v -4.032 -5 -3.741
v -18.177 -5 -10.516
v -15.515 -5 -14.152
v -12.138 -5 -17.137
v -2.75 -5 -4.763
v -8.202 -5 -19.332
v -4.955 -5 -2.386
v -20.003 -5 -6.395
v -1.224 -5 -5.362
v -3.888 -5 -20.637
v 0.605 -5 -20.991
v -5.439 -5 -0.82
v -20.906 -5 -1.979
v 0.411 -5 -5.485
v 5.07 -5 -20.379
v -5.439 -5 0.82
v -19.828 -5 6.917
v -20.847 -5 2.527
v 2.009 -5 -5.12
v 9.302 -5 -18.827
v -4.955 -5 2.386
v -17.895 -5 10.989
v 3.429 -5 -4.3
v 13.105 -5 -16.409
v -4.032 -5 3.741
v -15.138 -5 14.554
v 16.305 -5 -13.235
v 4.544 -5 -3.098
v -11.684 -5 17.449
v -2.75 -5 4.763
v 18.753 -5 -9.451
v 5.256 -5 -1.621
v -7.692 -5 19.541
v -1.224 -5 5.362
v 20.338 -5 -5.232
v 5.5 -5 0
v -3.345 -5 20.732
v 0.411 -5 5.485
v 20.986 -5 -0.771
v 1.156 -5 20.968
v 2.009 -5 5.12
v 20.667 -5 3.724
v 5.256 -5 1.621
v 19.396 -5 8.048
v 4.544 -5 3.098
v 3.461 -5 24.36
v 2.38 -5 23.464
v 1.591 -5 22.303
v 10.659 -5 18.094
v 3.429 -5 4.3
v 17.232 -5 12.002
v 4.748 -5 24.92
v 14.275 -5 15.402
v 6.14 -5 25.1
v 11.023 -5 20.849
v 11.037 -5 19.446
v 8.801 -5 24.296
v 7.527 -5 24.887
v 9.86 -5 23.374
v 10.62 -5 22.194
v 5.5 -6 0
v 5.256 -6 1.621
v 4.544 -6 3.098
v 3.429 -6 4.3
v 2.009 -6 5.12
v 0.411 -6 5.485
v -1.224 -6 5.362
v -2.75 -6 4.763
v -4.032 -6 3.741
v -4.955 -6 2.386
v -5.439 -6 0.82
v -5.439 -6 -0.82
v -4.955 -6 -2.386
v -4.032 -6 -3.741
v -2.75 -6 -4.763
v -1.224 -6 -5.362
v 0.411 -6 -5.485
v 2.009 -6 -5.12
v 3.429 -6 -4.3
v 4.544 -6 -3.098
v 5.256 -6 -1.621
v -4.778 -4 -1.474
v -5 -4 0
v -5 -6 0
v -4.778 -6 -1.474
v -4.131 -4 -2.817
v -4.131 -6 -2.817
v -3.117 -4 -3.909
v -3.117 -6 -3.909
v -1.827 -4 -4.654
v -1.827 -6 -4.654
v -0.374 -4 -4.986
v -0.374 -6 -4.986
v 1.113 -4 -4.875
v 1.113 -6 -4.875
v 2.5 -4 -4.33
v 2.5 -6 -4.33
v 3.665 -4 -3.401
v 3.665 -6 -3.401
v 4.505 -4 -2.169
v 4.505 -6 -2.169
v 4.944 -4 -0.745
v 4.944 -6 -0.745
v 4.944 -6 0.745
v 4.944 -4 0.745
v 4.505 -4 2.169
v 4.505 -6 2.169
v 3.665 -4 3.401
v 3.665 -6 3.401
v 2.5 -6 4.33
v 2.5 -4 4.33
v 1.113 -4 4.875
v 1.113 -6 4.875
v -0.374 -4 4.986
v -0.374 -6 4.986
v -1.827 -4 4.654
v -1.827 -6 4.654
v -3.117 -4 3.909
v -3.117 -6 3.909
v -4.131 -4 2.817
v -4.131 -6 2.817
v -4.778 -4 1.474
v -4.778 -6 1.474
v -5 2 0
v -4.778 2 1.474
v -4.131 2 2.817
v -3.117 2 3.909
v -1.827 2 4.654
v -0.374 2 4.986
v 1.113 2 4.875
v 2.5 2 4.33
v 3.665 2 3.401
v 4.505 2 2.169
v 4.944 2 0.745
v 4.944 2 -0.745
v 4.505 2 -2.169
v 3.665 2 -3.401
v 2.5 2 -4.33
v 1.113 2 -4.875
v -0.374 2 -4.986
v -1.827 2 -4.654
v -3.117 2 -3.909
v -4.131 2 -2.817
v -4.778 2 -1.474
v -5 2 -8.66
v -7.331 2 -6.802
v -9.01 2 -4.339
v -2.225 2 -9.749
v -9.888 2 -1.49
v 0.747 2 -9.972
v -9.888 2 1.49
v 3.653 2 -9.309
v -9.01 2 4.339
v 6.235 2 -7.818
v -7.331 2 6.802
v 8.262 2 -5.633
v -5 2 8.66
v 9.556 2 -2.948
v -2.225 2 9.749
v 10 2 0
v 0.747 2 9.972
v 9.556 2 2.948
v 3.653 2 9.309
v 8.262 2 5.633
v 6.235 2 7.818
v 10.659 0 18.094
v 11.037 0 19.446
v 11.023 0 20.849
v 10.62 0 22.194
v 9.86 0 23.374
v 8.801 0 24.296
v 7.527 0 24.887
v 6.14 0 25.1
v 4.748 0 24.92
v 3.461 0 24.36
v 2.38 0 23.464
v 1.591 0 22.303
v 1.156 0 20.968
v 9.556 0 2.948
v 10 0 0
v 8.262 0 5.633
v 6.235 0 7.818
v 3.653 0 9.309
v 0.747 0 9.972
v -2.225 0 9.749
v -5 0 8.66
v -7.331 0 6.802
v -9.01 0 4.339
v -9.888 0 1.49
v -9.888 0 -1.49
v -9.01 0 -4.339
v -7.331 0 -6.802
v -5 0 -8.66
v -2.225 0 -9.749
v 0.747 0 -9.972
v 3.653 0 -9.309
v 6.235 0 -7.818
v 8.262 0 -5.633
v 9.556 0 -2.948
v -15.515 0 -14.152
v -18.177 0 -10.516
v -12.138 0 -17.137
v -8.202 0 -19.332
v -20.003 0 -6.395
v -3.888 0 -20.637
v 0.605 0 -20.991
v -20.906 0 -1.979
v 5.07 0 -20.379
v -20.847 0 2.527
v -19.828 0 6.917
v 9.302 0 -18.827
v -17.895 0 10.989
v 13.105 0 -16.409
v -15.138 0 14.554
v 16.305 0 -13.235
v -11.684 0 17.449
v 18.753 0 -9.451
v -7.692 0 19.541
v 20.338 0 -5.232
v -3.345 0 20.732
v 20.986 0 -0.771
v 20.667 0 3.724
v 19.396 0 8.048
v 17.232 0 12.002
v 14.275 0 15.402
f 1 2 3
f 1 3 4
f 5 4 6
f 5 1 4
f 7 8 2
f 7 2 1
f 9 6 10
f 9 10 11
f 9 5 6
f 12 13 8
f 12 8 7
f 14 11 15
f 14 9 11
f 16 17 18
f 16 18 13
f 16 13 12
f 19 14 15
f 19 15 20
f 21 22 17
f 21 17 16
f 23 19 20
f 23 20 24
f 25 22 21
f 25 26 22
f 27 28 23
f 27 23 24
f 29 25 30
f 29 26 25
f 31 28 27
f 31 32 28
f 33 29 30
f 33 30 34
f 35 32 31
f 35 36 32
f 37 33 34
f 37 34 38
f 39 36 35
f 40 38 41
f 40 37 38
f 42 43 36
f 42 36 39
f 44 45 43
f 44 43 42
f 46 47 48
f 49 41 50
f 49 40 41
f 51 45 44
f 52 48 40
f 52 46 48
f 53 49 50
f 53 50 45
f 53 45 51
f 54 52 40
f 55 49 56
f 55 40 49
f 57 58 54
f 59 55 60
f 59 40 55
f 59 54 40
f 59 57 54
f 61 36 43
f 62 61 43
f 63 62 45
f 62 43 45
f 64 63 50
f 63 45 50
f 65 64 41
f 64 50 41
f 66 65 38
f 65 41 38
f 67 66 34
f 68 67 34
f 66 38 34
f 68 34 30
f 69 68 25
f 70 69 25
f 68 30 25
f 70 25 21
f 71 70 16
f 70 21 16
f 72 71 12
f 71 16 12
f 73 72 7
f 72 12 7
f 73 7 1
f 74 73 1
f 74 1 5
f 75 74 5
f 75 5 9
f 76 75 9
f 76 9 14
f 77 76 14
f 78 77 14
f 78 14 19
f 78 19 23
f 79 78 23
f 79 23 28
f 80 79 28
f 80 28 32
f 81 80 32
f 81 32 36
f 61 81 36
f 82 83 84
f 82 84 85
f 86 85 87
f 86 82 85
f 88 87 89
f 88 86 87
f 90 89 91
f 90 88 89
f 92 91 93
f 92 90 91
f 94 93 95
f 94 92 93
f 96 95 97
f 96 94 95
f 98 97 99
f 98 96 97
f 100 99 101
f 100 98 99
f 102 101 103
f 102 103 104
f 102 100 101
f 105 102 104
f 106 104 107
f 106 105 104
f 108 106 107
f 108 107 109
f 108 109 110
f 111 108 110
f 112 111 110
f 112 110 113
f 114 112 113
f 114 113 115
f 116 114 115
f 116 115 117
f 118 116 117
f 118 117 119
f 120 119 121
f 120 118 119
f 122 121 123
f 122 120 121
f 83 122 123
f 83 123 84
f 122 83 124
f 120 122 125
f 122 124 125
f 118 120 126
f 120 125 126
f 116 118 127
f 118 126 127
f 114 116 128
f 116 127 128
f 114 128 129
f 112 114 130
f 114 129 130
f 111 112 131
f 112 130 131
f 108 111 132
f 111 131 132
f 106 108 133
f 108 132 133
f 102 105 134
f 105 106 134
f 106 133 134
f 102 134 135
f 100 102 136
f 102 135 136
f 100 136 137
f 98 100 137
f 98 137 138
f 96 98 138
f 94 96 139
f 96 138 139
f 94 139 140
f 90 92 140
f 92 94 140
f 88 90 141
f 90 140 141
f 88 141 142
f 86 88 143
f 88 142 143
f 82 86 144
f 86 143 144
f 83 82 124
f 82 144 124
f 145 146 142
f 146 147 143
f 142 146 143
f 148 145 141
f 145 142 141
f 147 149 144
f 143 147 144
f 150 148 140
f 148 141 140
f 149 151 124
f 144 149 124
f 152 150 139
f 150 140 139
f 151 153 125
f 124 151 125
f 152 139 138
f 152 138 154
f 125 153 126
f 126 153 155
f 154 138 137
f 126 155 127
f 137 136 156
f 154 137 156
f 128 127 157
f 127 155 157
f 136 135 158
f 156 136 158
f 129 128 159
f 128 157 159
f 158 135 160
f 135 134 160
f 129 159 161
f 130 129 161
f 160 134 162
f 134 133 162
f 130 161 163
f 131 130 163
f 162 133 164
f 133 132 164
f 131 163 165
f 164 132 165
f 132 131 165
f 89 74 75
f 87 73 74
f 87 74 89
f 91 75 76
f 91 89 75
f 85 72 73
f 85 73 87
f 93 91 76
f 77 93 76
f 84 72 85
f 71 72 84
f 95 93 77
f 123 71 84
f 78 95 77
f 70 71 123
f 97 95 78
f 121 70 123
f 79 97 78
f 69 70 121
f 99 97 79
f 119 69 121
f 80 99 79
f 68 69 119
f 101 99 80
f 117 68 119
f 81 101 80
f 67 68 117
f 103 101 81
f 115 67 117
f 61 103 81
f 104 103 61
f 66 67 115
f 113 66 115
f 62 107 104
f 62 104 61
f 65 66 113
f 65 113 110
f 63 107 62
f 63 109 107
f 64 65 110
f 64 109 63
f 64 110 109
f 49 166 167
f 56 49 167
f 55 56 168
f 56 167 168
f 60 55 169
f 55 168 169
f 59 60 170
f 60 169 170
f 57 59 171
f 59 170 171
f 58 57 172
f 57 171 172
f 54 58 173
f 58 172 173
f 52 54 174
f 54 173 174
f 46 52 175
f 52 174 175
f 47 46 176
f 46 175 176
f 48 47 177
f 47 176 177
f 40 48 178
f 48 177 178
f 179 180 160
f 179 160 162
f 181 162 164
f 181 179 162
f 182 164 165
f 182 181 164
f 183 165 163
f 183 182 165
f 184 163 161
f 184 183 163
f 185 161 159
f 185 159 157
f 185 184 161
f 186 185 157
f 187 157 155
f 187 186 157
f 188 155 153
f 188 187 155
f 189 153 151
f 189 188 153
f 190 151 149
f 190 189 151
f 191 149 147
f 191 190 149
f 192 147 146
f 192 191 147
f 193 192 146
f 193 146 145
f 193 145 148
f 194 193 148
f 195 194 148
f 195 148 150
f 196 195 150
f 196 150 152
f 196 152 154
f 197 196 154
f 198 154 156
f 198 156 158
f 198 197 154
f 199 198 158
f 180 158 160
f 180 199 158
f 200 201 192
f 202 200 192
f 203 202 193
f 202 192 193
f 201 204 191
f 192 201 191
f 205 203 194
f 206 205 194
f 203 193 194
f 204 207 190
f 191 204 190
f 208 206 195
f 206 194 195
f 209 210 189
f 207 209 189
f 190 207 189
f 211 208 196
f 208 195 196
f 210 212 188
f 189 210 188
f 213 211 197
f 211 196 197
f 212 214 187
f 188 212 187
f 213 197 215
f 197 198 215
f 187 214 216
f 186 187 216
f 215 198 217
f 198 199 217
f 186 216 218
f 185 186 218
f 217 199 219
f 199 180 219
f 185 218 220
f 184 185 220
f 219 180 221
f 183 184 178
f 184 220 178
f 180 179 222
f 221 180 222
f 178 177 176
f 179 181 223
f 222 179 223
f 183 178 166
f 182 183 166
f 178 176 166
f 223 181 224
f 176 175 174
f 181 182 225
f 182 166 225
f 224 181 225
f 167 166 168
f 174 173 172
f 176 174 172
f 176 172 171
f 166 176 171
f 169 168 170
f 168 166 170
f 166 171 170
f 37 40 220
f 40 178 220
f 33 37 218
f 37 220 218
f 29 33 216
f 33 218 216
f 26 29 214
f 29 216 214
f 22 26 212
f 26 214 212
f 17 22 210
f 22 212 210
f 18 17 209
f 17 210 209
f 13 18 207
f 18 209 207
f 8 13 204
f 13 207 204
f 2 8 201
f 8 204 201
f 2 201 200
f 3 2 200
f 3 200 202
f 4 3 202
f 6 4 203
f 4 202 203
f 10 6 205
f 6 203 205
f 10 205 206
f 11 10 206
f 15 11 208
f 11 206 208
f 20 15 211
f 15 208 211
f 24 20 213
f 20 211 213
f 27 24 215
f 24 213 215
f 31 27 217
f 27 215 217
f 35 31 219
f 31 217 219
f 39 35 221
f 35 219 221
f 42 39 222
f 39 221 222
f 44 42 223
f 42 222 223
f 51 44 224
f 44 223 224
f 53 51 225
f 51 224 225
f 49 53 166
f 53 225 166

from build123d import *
from build123d import SkipClean  # not in build123d's __all__

# Parameters (mm, degrees)
F2_R      = 21
F3_DEPTH  = 3
F4_R      = 10
F5_DEPTH  = 2
F6_R      = 5
F7_DEPTH  = 25
F8_R      = 5
F9_DEPTH  = 3
F10_R     = 5.5
F11_DEPTH = 1
F12_DEPTH = 1
F13_R     = 5.5
F14_DEPTH = 1
F15_R     = 5
F16_DEPTH = 1
F17_DEPTH = 2


# Not quite as in the source:
# - the program builds the solid bodies; features that only make, move or delete a surface that nothing else refers to are left out


with BuildPart() as f3:
    # F2 (on Front) → F3 (new body)
    with BuildSketch(Plane.XZ):
        Circle(F2_R)
    extrude(amount=F3_DEPTH)

    # F4 (on Front) → F5 (join)
    with BuildSketch(Plane.XZ):
        Circle(F4_R)
    extrude(amount=-F5_DEPTH)

    # F6 (on face) → F7 (cut)
    with BuildSketch(Plane(origin=(0, 2, 0), x_dir=(-1, 0, 0), z_dir=(0, 1, 0))):
        Circle(F6_R)
    extrude(amount=-F7_DEPTH, mode=Mode.SUBTRACT)

    # F8 (on face) → F9 (join)
    with BuildSketch(Plane.XZ.offset(3)):
        with Locations((6.0798030726, 20.1006466214)):
            Circle(F8_R)
        with BuildLine():
            ThreePointArc((10.6593068139, 18.093622585), (6.0798030726, 20.1006466214), (1.1556392931, 20.968178219))
            ThreePointArc((1.1556392931, 20.968178219), (4.6322309124, 15.3147783782), (10.6593068139, 18.093622585))
        make_face()
    extrude(amount=-F9_DEPTH)

    # F10 (on face) → F11 (join)
    with BuildSketch(Plane.XZ.offset(3)):
        with BuildLine():
            ThreePointArc((10.6593068139, 18.093622585), (7.5273752327, 24.8865148646), (1.1556392931, 20.968178219))
            ThreePointArc((1.1556392931, 20.968178219), (-6.0798030726, -20.1006466214), (10.6593068139, 18.093622585))
        make_face()
        Circle(F10_R, mode=Mode.SUBTRACT)
    with SkipClean():  # cleaning this boolean's faces spoils the solid; the shape is the same uncleaned
        extrude(amount=F11_DEPTH)

    # F12 (add): a face of the model
    f12_faces = [f3.faces().sort_by_distance(p)[0] for p in [
        (-5.3444365081, -3, 0),
    ]]
    with SkipClean():  # cleaning this boolean's faces spoils the solid; the shape is the same uncleaned
        extrude(f12_faces, amount=F12_DEPTH)

    # F13 (on face) → F14 (join)
    with BuildSketch(Plane.XZ.offset(4)):
        with BuildLine():
            ThreePointArc((10.6593068139, 18.093622585), (7.5273752327, 24.8865148646), (1.1556392931, 20.968178219))
            ThreePointArc((1.1556392931, 20.968178219), (-6.0798030726, -20.1006466214), (10.6593068139, 18.093622585))
        make_face()
        Circle(F13_R, mode=Mode.SUBTRACT)
    extrude(amount=F14_DEPTH)

    # F15 (on face) → F16 (cut)
    with BuildSketch(Plane.XZ.offset(5)):
        Circle(F15_R)
    extrude(amount=-F16_DEPTH, mode=Mode.SUBTRACT)

    # F17 (add): a face of the model
    f17_faces = [f3.faces().sort_by_distance(p)[0] for p in [
        (-5.3444365081, -4, 0),
    ]]
    extrude(f17_faces, amount=F17_DEPTH)


solid = f3.part
